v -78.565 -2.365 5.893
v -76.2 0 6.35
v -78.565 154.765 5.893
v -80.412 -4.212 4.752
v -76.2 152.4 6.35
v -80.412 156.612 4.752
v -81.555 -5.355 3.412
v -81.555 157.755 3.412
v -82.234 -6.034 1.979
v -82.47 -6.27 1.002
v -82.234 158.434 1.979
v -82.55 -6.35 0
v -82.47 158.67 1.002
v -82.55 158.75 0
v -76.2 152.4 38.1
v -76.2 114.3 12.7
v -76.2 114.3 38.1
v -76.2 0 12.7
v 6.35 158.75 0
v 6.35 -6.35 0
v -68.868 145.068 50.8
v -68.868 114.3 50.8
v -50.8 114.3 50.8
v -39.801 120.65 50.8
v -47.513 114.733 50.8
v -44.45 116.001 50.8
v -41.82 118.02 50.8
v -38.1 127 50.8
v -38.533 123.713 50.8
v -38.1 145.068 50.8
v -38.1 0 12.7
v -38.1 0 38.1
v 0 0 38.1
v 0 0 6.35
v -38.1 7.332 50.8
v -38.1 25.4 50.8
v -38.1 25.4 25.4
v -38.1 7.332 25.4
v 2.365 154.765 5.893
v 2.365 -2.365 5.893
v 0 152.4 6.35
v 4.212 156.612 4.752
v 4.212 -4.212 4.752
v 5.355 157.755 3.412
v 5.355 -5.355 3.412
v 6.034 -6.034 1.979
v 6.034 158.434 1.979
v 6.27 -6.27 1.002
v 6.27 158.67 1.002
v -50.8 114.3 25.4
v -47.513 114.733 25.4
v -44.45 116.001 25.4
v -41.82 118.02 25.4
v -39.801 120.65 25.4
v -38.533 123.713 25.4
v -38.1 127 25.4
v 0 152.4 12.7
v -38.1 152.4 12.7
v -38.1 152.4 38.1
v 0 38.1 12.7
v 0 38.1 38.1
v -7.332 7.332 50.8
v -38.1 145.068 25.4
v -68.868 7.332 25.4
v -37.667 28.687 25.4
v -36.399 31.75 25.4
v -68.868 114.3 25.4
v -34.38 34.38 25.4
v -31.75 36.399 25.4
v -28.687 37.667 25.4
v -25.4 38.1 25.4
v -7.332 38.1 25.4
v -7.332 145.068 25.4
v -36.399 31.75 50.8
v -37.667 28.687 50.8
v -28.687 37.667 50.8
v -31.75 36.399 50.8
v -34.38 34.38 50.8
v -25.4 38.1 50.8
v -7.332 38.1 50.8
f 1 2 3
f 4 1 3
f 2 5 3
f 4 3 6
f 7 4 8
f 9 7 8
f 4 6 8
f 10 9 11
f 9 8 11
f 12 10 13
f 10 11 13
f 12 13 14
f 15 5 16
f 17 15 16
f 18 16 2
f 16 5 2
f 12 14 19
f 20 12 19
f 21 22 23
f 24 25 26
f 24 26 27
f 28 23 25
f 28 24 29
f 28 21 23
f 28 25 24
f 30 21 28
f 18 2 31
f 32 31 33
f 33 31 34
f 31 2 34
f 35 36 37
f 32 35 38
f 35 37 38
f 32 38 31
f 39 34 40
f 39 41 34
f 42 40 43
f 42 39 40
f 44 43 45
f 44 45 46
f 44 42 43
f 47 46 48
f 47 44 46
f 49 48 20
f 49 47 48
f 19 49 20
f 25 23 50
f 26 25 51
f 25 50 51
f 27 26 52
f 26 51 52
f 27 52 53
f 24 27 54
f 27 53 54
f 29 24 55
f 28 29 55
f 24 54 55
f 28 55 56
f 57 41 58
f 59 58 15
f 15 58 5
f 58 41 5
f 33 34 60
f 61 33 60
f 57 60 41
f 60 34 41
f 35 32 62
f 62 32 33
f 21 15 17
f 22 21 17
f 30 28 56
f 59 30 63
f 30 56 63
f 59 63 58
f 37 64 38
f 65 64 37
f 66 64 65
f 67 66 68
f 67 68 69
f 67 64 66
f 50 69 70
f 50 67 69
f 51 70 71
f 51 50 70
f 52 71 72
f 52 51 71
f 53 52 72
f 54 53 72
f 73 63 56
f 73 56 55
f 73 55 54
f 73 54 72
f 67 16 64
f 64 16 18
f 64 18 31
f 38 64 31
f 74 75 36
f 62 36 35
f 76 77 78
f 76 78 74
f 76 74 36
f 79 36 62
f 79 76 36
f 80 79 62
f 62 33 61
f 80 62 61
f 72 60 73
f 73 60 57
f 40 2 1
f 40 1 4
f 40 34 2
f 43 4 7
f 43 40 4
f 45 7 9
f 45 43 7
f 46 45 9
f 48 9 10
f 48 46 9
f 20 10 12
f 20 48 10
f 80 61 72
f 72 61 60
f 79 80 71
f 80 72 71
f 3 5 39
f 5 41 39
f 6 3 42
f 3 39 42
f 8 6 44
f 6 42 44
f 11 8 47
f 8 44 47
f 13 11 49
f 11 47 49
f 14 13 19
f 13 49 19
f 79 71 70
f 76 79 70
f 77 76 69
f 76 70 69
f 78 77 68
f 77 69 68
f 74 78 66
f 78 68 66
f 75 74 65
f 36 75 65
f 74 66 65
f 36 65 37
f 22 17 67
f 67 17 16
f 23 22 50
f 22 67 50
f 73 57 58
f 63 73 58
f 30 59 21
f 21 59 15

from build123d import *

# Parameters (mm, degrees)
F0_W     = 88.9
F0_H     = 165.1
F1_DEPTH = 6.35
F2_DEPTH = 25.4
F3_DEPTH = 50.8
F4_R     = 6.34999
F5_SIZE2 = 12.7
F5_SIZE  = 7.3323484187
F6_SIZE2 = 12.7
F6_SIZE  = 7.3323484187
F7_SIZE2 = 12.7
F7_SIZE  = 7.3323484187


# Not quite as in the source:
# - a fillet or chamfer is up to 0.001 mm smaller than in the source, because OpenCascade refuses the exact size


with BuildPart() as f1:
    # F0 (on Top) → F1 (new body)
    with BuildSketch(Plane.XY):
        with Locations((-38.1, 76.2)):
            Rectangle(F0_W, F0_H)
        Polygon((-76.2, 114.3), (-76.2, 152.4), (-38.1, 152.4), (0, 152.4), (0, 38.1), (0, 0), (-38.1, 0), (-76.2, 0), align=None, mode=Mode.SUBTRACT)
    extrude(amount=F1_DEPTH)

    # F0 (on Top) → F2 (join)
    with BuildSketch(Plane.XY):
        with BuildLine():
            Line((0, 152.4), (-38.1, 152.4))
            Line((-38.1, 152.4), (-38.1, 127))
            ThreePointArc((-38.1, 127), (-41.8197438789, 118.0197438789), (-50.8, 114.3))
            Line((-50.8, 114.3), (-76.2, 114.3))
            Line((-76.2, 114.3), (-76.2, 0))
            Line((-76.2, 0), (-38.1, 0))
            Line((-38.1, 0), (-38.1, 25.4))
            ThreePointArc((-38.1, 25.4), (-34.3802561211, 34.3802561211), (-25.4, 38.1))
            Line((-25.4, 38.1), (0, 38.1))
            Line((0, 38.1), (0, 152.4))
        make_face()
    extrude(amount=F2_DEPTH)

    # F0 (on Top) → F3 (join)
    with BuildSketch(Plane.XY):
        with BuildLine():
            Line((-38.1, 152.4), (-76.2, 152.4))
            Line((-76.2, 152.4), (-76.2, 114.3))
            Line((-76.2, 114.3), (-50.8, 114.3))
            ThreePointArc((-50.8, 114.3), (-41.8197438789, 118.0197438789), (-38.1, 127))
            Line((-38.1, 127), (-38.1, 152.4))
        make_face()
        with BuildLine():
            Line((0, 0), (0, 38.1))
            Line((0, 38.1), (-25.4, 38.1))
            ThreePointArc((-25.4, 38.1), (-34.3802561211, 34.3802561211), (-38.1, 25.4))
            Line((-38.1, 25.4), (-38.1, 0))
            Line((-38.1, 0), (0, 0))
        make_face()
    extrude(amount=F3_DEPTH)

    # F4 (radius 6.35 in the source; OpenCascade refuses exactly that, so slightly less here)
    f4_edges = [f1.edges().sort_by_distance(p)[0] for p in [
        (6.35, 76.2, 6.35),
        (-38.1, 158.75, 6.35),
        (-82.55, 76.2, 6.35),
        (-38.1, -6.35, 6.35),
    ]]
    fillet(f4_edges, radius=F4_R)

    # F5
    f5_edges = [f1.edges().sort_by_distance(p)[0] for p in [
        (0, 95.25, 25.4),
        (-57.15, 0, 25.4),
        (-76.2, 57.15, 25.4),
        (-19.05, 152.4, 25.4),
    ]]
    f5_side = f1.faces().sort_by_distance((-38.1, 76.2, 25.4))[0]
    chamfer(f5_edges, length=F5_SIZE, length2=F5_SIZE2, reference=f5_side)

    # F6
    f6_edges = [f1.edges().sort_by_distance(p)[0] for p in [
        (-57.15, 152.4, 50.8),
        (-76.2, 133.35, 50.8),
    ]]
    f6_side = f1.faces().sort_by_distance((-57.546042, 133.746042, 50.8))[0]
    chamfer(f6_edges, length=F6_SIZE, length2=F6_SIZE2, reference=f6_side)

    # F7
    f7_edges = [f1.edges().sort_by_distance(p)[0] for p in [
        (0, 19.05, 50.8),
        (-19.05, 0, 50.8),
    ]]
    f7_side = f1.faces().sort_by_distance((-18.653958, 18.653958, 50.8))[0]
    chamfer(f7_edges, length=F7_SIZE, length2=F7_SIZE2, reference=f7_side)


solid = f1.part
